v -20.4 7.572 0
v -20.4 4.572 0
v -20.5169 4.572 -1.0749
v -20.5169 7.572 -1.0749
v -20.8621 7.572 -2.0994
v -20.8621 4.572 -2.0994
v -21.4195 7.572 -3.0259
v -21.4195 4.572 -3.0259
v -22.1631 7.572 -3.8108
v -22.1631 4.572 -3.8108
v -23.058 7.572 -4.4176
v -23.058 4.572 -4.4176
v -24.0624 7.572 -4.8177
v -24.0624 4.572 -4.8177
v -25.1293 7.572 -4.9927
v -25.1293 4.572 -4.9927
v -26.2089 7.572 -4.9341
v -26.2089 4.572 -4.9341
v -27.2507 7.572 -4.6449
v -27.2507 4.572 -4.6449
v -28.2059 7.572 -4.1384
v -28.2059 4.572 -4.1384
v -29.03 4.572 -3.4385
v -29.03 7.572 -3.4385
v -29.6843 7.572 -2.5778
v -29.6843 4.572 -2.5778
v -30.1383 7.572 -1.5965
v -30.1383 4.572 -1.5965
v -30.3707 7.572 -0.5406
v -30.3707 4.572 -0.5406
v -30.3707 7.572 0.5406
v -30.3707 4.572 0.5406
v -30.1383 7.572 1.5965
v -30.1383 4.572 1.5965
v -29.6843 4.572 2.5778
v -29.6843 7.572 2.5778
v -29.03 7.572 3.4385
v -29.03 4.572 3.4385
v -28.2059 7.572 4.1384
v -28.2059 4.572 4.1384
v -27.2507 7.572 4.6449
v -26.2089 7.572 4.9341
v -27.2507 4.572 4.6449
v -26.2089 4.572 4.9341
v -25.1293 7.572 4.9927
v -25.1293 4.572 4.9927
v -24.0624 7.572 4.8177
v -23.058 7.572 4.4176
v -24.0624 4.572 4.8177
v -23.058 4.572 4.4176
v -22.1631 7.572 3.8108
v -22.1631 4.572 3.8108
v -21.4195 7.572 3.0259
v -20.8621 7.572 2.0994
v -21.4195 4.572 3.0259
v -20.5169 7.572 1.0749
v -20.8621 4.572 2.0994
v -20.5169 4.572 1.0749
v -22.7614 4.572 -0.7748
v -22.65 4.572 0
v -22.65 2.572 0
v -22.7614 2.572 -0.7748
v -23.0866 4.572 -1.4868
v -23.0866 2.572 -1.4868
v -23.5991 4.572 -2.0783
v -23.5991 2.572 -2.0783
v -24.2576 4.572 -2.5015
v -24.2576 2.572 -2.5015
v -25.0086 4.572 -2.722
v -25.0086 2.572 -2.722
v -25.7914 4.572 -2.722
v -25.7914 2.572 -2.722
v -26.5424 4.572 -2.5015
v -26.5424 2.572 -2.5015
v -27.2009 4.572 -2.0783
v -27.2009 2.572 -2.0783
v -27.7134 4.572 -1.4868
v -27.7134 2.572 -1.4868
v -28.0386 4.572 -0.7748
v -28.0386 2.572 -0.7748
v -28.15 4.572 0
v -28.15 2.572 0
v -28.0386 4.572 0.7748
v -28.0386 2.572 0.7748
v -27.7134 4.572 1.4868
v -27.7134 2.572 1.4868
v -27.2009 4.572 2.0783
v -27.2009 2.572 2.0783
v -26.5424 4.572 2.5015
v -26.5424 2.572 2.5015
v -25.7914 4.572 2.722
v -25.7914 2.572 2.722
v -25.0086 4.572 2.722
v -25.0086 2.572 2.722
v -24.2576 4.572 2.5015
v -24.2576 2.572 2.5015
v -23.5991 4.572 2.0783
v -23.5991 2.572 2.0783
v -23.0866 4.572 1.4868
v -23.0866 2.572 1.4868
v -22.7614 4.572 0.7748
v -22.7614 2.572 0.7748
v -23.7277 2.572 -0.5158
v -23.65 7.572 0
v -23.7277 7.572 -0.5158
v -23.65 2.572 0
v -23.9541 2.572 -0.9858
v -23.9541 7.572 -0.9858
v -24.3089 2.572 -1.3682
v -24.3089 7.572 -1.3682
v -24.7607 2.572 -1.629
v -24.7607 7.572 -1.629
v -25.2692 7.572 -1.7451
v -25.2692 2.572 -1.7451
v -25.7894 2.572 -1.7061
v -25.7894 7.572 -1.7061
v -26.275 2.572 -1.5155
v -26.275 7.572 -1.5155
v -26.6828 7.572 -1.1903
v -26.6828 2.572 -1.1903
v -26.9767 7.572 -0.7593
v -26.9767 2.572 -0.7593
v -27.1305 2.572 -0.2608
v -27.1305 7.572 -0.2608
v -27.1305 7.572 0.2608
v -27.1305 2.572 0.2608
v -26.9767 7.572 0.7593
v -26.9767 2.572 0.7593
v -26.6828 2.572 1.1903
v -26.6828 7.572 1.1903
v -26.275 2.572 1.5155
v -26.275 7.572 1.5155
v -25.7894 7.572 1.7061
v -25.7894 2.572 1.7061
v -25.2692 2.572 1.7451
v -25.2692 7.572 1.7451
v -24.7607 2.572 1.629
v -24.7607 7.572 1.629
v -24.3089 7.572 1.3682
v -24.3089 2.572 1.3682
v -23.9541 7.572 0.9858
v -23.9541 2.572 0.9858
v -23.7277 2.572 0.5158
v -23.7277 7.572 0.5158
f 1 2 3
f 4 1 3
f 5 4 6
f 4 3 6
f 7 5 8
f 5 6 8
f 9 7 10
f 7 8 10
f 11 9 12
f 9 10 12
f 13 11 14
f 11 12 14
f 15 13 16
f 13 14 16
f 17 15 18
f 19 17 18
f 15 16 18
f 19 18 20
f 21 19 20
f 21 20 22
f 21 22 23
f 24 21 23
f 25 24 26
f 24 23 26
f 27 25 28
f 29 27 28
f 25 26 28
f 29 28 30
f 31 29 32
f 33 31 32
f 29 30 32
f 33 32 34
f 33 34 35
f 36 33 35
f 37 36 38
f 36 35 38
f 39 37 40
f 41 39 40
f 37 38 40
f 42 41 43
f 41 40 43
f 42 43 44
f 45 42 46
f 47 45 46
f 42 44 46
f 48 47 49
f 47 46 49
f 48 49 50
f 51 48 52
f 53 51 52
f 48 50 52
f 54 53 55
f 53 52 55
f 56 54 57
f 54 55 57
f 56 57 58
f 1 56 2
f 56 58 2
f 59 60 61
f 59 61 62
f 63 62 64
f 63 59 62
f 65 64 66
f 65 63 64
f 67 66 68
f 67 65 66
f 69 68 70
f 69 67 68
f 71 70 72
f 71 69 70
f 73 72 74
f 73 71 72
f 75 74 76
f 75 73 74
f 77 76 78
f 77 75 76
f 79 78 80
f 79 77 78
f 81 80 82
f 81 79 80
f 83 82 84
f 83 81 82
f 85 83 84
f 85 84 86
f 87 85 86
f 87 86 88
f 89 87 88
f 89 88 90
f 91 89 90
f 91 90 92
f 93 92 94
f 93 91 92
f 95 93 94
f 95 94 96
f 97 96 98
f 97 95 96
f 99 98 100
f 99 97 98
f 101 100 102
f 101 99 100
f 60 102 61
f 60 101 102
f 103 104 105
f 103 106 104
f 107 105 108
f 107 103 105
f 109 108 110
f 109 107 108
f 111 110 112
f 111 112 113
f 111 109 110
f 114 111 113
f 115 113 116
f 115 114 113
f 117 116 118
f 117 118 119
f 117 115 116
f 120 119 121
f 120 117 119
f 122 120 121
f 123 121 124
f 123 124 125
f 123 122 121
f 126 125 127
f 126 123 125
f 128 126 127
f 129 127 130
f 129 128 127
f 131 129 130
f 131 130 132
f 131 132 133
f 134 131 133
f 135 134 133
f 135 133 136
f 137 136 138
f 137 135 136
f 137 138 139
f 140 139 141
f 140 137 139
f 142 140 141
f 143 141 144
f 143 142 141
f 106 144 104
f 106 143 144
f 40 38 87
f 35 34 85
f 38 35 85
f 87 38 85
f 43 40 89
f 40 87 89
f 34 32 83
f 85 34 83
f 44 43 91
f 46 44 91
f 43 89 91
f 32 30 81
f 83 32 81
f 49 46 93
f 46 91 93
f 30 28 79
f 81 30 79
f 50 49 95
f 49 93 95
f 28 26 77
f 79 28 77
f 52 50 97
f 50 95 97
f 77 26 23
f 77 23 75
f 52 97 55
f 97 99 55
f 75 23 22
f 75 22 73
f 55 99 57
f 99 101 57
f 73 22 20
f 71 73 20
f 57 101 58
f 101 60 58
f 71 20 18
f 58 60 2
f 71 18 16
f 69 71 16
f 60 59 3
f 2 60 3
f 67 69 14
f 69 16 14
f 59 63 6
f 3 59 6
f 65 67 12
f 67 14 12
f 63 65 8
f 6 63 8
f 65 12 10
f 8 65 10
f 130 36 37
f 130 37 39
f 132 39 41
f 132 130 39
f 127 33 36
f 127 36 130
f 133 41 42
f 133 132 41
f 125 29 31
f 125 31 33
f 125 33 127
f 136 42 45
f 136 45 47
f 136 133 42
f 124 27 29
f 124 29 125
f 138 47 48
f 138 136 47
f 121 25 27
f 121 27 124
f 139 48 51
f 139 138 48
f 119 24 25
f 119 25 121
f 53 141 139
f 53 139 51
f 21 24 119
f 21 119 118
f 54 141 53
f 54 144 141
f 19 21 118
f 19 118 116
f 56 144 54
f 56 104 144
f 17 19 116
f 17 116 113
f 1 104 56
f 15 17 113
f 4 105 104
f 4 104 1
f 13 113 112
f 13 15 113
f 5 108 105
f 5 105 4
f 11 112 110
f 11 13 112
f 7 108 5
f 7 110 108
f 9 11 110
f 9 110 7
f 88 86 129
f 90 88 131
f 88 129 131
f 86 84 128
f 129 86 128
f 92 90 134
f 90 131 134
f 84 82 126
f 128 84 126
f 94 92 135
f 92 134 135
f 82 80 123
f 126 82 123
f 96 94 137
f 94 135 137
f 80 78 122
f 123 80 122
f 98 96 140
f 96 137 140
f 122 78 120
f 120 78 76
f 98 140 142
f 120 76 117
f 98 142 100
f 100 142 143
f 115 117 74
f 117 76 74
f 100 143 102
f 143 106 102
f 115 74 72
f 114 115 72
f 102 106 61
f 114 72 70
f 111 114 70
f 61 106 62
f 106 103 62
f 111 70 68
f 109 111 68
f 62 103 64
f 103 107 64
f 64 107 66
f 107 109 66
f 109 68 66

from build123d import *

# Parameters (mm, degrees)
SKETCH1_R           = 57.15
SKETCH1_R_2         = 1.397
SKETCH1_R_3         = 3.175
BOSS_EXTRUDE1_DEPTH = 4.572
SKETCH2_R           = 2.75
SKETCH2_R_2         = 1.75
BOSS_EXTRUDE2_DEPTH = 2
SKETCH3_R           = 5
SKETCH3_R_2         = 1.75
BOSS_EXTRUDE3_DEPTH = 3


with BuildPart() as part:
    # Sketch1 → Boss-Extrude1 (new body)
    with BuildSketch(Plane(origin=(0, 0, 0), x_dir=(1, 0, 0), z_dir=(0, 1, 0))):
        Circle(SKETCH1_R)
        with Locations((0, 6.35)):
            Circle(SKETCH1_R_2, mode=Mode.SUBTRACT)
        with Locations((0, 25.4)):
            Circle(SKETCH1_R_3, mode=Mode.SUBTRACT)
        with Locations((0, 50.8)):
            Circle(SKETCH1_R_3, mode=Mode.SUBTRACT)
        with Locations((25.4, 0)):
            Circle(SKETCH1_R_3, mode=Mode.SUBTRACT)
        with Locations((0, -25.4)):
            Circle(SKETCH1_R_3, mode=Mode.SUBTRACT)
        with Locations((-25.4, 0)):
            Circle(SKETCH1_R_3, mode=Mode.SUBTRACT)
        with Locations((6.35, 0)):
            Circle(SKETCH1_R_2, mode=Mode.SUBTRACT)
        with Locations((0, -6.35)):
            Circle(SKETCH1_R_2, mode=Mode.SUBTRACT)
        with Locations((-6.35, 0)):
            Circle(SKETCH1_R_2, mode=Mode.SUBTRACT)
        with Locations((35.921024484, 35.921024484)):
            Circle(SKETCH1_R_3, mode=Mode.SUBTRACT)
        with Locations((50.8, 0)):
            Circle(SKETCH1_R_3, mode=Mode.SUBTRACT)
        with Locations((35.921024484, -35.921024484)):
            Circle(SKETCH1_R_3, mode=Mode.SUBTRACT)
        with Locations((0, -50.8)):
            Circle(SKETCH1_R_3, mode=Mode.SUBTRACT)
        with Locations((-35.921024484, -35.921024484)):
            Circle(SKETCH1_R_3, mode=Mode.SUBTRACT)
        with Locations((-50.8, 0)):
            Circle(SKETCH1_R_3, mode=Mode.SUBTRACT)
        with Locations((-35.921024484, 35.921024484)):
            Circle(SKETCH1_R_3, mode=Mode.SUBTRACT)
    extrude(amount=BOSS_EXTRUDE1_DEPTH)


with BuildPart() as body_2:
    # Sketch2 → Boss-Extrude2 (new body)
    with BuildSketch(Plane(origin=(0, 4.572, 0), x_dir=(1, 0, 0), z_dir=(0, 1, 0))):
        with Locations((-25.4, 0)):
            Circle(SKETCH2_R)
        with Locations((-25.4, 0)):
            Circle(SKETCH2_R_2, mode=Mode.SUBTRACT)
    extrude(amount=-BOSS_EXTRUDE2_DEPTH)

    # Sketch3 → Boss-Extrude3 (add)
    with BuildSketch(Plane(origin=(0, 4.572, 0), x_dir=(1, 0, 0), z_dir=(0, 1, 0))):
        with Locations((-25.4, 0)):
            Circle(SKETCH3_R)
        with Locations((-25.4, 0)):
            Circle(SKETCH3_R_2, mode=Mode.SUBTRACT)
    extrude(amount=BOSS_EXTRUDE3_DEPTH)


solid = body_2.part
